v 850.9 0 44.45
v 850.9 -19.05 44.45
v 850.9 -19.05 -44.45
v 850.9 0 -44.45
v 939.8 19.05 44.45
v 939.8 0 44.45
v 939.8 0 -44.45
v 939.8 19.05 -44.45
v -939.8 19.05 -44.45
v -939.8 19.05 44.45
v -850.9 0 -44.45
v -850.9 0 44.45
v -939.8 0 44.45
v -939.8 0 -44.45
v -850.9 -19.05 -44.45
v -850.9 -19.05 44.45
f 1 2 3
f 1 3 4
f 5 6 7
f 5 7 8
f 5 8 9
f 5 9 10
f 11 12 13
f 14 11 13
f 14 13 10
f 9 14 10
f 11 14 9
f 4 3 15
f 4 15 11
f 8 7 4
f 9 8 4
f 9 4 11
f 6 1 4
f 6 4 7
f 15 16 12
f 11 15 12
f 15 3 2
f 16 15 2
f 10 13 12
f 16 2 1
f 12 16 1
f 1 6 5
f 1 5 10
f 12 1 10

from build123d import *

# Parameters (mm, degrees)
F0_W     = 38.1
F0_H     = 88.9
F1_DEPTH = 939.8
F2_W     = 88.9
F2_H     = 19.05
F3_DEPTH = 88.9


with BuildPart() as f1:
    # F0 (on Right) → F1 (new body)
    with BuildSketch(Plane.YZ):
        Rectangle(F0_W, F0_H)
    extrude(amount=F1_DEPTH)

    # F2 (on face) → F3 (cut, through all)
    with BuildSketch(Plane.XY.offset(44.45)):
        with Locations((895.35, -9.525)):
            Rectangle(F2_W, F2_H)
    extrude(amount=-F3_DEPTH, mode=Mode.SUBTRACT)

    # F4: F1 across plane


with BuildPart() as f1_1:
    add(f1.part)
    add(f1.part.mirror(Plane.YZ))


solid = f1_1.part
